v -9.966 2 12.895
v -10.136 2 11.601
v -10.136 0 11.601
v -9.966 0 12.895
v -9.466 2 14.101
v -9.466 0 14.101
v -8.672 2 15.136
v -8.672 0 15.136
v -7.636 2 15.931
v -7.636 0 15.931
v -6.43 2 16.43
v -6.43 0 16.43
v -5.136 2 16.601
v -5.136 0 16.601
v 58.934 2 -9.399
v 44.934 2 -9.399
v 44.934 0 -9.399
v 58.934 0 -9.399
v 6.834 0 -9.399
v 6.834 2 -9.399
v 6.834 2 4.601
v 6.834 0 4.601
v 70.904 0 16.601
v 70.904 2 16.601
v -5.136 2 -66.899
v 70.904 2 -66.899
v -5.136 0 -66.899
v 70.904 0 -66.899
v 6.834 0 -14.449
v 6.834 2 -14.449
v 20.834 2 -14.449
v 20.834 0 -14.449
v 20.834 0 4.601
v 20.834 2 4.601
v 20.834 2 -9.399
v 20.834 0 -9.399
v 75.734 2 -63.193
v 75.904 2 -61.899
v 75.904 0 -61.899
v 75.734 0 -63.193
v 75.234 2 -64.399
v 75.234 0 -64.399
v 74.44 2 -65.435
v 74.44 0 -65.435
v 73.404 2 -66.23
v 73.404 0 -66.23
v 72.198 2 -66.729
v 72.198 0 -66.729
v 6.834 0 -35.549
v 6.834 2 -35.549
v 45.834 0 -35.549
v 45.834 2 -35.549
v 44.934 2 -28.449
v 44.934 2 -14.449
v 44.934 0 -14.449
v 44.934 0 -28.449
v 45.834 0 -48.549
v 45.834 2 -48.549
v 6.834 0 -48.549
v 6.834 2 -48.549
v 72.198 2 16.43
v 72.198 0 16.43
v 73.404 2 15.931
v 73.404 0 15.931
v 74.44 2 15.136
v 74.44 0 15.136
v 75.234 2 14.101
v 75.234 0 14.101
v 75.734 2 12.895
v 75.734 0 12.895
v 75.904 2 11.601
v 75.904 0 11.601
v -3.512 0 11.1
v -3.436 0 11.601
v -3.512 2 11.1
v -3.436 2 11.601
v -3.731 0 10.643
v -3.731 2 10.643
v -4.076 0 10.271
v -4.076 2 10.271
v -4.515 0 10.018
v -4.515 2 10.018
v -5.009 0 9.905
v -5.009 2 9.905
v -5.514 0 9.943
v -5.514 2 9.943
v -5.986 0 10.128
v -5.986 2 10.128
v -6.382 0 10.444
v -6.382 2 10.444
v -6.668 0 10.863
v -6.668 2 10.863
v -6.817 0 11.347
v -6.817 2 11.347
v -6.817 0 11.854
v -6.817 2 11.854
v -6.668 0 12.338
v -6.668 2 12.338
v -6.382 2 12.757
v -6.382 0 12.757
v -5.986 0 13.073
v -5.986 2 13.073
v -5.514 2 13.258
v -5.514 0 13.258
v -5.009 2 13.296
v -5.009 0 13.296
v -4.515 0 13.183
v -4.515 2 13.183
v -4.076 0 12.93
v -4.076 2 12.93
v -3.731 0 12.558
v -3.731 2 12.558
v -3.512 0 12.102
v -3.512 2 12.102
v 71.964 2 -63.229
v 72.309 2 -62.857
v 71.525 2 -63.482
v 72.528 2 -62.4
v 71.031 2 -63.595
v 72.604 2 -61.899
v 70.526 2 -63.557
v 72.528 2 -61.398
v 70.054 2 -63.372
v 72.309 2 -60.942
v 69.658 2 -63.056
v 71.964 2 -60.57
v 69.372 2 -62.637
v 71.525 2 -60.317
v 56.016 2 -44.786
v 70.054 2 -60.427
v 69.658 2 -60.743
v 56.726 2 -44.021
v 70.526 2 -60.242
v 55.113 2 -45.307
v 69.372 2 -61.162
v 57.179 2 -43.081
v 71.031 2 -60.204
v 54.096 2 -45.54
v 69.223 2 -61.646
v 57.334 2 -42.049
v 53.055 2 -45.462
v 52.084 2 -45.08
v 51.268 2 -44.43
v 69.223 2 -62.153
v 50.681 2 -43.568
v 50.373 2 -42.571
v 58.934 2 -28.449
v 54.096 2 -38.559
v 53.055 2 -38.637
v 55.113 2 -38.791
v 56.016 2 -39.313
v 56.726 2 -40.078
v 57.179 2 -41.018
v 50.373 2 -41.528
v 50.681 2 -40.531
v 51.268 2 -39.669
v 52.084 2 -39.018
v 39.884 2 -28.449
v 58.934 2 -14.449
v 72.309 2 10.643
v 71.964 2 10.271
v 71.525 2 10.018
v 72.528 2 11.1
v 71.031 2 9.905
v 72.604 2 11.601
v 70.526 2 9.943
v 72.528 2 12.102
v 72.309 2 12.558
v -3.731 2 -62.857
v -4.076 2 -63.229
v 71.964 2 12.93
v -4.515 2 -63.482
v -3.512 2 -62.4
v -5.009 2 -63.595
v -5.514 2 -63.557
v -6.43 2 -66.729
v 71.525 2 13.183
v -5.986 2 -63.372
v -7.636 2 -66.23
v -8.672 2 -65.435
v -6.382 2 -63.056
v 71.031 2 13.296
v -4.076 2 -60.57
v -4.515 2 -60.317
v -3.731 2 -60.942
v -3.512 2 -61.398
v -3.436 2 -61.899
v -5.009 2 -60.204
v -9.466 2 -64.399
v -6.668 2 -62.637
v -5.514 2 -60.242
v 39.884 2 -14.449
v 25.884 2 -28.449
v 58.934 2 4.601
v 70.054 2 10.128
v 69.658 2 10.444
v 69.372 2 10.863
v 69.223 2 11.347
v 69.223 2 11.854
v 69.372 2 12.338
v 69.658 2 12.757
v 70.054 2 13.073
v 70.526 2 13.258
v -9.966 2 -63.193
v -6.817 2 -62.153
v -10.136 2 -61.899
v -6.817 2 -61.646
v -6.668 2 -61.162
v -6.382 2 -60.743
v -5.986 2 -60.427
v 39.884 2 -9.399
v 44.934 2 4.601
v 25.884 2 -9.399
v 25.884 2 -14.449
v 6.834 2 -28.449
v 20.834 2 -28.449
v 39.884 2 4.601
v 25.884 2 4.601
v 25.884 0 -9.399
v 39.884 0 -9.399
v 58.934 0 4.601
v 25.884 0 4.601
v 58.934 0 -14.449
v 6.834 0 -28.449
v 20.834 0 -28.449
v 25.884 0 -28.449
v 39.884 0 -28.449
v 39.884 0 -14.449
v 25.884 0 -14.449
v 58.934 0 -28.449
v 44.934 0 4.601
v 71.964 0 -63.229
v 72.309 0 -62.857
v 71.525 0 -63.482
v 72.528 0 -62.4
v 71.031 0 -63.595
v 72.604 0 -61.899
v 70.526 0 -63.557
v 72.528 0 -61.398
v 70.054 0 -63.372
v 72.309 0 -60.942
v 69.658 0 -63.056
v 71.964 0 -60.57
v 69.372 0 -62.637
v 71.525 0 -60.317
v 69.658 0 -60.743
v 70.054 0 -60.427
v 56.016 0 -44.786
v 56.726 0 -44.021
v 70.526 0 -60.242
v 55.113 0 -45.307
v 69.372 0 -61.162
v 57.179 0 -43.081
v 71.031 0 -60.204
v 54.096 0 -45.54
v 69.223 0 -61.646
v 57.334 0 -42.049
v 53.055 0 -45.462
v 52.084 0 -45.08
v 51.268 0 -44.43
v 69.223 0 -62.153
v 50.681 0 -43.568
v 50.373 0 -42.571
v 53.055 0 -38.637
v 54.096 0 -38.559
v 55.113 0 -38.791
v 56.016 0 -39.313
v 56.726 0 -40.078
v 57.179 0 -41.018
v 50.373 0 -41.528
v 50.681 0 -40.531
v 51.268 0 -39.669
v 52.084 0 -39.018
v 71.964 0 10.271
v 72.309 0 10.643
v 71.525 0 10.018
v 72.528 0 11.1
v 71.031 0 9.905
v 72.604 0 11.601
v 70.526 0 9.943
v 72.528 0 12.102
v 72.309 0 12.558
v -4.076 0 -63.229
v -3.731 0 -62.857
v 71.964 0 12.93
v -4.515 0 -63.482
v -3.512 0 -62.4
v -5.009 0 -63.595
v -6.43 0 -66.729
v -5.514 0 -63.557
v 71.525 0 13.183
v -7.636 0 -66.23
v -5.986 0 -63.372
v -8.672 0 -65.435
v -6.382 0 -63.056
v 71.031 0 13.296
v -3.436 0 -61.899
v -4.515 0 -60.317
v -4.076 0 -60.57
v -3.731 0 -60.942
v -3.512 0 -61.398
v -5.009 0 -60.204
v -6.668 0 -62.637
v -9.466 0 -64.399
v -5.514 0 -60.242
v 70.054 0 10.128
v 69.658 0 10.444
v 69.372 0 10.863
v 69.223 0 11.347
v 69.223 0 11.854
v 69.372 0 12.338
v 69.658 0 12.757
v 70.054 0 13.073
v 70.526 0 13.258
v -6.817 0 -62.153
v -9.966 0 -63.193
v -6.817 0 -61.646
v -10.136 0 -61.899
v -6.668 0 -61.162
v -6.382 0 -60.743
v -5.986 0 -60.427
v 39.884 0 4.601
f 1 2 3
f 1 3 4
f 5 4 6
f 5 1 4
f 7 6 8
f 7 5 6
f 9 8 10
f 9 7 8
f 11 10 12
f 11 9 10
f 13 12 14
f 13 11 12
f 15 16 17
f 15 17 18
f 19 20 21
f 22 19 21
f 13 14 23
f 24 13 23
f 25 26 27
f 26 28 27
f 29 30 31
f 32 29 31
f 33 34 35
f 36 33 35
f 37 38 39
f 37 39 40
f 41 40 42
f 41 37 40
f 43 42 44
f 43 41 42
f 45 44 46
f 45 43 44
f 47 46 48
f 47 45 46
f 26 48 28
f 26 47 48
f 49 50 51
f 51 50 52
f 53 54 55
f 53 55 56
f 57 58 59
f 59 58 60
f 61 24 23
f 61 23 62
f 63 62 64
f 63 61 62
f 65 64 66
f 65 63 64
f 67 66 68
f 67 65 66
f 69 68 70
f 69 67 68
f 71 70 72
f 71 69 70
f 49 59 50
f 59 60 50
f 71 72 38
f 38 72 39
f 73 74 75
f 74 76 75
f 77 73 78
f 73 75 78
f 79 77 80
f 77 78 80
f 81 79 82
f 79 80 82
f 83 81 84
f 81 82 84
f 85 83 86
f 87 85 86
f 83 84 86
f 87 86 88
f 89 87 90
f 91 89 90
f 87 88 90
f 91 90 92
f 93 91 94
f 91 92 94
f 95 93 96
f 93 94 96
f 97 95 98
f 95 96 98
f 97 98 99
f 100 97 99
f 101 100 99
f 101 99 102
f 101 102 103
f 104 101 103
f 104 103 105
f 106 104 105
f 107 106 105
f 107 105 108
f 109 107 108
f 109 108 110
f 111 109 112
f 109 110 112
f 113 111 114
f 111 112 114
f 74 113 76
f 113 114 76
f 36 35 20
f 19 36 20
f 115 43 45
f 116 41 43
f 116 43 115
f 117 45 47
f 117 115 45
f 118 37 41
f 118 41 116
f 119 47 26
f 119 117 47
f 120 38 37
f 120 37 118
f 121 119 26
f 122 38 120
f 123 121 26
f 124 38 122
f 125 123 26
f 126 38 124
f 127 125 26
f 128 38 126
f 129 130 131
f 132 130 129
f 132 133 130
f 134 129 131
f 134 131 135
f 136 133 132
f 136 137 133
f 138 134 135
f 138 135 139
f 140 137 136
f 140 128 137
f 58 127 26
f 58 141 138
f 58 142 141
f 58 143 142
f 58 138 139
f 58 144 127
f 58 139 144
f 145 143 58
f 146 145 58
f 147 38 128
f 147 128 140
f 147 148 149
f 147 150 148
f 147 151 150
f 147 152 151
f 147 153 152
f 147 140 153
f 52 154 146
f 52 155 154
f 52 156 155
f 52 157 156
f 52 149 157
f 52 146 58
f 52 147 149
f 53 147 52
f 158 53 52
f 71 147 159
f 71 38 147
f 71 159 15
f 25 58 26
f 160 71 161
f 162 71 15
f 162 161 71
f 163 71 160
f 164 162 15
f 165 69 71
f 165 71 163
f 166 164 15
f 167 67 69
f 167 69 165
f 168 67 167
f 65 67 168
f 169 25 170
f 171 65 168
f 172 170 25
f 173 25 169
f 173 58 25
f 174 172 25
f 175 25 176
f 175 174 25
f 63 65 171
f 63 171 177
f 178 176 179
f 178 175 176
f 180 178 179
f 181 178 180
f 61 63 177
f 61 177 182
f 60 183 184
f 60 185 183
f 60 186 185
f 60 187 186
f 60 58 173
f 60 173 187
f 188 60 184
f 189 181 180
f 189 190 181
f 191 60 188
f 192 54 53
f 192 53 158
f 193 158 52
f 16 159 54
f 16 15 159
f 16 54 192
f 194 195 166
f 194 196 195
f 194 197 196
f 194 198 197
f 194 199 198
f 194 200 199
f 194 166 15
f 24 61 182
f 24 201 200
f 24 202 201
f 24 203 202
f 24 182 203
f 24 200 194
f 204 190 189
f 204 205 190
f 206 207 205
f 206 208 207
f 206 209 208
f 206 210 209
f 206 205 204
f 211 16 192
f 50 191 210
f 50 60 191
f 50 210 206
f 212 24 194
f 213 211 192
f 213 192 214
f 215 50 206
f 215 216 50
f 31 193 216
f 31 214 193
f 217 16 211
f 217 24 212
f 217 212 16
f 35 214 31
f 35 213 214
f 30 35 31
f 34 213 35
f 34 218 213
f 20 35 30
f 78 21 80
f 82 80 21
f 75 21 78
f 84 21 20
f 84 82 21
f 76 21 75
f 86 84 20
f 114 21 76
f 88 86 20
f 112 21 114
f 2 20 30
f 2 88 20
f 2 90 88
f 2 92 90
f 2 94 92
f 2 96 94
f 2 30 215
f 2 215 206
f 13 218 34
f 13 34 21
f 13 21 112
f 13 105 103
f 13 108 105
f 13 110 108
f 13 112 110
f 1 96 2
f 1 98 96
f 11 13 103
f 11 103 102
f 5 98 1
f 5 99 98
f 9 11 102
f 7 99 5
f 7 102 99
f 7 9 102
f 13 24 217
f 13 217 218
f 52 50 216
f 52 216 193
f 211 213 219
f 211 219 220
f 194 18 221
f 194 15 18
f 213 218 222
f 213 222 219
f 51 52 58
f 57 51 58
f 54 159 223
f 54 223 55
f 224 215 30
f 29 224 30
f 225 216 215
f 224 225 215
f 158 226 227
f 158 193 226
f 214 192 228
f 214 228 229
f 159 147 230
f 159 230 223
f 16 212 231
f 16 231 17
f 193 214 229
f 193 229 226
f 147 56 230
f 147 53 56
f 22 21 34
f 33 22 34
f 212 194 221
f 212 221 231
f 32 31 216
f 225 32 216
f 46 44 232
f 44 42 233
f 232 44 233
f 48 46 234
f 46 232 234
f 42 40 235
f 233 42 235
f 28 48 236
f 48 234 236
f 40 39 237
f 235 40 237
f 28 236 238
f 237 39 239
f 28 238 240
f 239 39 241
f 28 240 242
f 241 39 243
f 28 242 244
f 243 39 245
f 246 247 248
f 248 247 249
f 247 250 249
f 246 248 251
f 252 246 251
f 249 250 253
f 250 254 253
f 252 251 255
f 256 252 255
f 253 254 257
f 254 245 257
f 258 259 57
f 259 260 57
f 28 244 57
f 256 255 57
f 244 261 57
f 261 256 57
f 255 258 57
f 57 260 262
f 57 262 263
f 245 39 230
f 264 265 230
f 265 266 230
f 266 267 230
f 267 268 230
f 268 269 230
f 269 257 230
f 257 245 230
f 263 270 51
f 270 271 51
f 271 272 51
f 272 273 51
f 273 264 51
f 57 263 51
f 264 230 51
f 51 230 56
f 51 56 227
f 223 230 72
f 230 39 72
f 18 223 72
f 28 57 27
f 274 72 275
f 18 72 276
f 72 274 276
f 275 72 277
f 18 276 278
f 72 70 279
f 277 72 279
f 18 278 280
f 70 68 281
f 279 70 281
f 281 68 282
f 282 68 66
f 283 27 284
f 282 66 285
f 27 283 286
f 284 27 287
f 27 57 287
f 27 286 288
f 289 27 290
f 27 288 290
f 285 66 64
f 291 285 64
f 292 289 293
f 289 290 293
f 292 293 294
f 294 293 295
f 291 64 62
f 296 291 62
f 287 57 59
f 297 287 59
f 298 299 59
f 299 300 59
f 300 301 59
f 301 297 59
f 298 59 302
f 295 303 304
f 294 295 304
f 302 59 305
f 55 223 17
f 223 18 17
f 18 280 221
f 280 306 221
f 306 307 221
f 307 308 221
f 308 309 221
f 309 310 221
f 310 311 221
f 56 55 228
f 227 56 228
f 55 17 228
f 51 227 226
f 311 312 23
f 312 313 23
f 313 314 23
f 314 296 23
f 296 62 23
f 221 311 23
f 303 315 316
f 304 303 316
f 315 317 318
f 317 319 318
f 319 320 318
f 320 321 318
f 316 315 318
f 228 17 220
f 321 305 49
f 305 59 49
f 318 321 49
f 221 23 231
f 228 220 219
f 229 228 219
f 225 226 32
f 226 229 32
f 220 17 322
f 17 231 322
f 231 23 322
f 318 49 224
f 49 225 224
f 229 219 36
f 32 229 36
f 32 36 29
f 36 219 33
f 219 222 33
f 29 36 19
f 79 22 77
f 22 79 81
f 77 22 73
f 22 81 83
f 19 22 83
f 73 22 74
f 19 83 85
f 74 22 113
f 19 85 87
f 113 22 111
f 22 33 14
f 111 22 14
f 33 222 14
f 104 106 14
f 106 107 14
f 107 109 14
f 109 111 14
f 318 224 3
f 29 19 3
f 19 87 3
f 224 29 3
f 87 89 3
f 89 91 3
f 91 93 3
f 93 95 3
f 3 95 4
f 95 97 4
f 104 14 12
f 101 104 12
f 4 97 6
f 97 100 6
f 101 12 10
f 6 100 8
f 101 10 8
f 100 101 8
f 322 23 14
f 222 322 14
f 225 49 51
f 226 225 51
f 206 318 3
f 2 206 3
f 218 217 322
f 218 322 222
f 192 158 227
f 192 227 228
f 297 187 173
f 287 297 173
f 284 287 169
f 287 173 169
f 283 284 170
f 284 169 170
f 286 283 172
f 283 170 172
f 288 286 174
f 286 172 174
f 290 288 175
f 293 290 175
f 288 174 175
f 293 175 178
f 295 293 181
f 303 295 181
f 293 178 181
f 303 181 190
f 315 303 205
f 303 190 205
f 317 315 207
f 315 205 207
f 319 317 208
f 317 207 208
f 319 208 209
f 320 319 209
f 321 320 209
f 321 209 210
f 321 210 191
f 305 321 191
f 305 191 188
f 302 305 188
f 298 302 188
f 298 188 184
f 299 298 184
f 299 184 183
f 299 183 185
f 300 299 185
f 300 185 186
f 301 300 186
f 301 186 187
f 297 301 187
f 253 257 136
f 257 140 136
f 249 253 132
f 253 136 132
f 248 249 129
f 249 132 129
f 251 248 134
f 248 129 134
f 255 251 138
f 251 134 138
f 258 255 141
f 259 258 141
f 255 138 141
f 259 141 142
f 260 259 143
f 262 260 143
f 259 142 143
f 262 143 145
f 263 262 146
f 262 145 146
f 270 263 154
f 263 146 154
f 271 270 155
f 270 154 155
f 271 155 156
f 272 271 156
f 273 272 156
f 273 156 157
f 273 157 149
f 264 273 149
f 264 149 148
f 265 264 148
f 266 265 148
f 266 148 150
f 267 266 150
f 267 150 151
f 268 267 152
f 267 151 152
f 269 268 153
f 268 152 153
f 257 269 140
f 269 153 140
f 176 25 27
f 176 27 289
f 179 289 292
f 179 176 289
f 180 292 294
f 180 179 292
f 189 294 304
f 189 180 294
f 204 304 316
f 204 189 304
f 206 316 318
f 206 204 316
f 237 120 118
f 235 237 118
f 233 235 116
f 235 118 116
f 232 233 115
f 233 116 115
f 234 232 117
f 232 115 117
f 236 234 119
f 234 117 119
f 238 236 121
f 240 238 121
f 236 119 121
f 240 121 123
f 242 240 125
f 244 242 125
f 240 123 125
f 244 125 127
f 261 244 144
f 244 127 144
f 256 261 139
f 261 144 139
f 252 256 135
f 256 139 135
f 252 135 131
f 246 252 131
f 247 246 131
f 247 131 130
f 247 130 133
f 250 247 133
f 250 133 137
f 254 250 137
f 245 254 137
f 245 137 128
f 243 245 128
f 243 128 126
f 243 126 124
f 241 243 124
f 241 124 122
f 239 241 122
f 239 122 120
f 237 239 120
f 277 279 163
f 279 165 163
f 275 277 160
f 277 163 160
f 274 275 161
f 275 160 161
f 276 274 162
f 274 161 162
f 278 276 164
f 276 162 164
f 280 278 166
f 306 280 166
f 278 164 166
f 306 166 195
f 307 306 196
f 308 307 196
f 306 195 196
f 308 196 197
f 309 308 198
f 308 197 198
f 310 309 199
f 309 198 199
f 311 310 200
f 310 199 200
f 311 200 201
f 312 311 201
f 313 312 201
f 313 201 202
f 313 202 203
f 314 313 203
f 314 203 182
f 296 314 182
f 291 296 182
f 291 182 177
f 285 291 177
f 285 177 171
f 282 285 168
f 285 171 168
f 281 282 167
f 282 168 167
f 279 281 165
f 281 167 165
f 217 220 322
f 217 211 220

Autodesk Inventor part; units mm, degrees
ref_plane "YZ Plane" through (0, 0, 0) normal (1, 0, 0) x (0, 1, 0)
ref_plane "XZ Plane" through (0, 0, 0) normal (0, 1, 0) x (-1, 0, 0)
ref_plane "XY Plane" through (0, 0, 0) normal (0, 0, 1) x (1, 0, 0)
sketch "Sketch1" plane through (0, 0, 0) normal (0, 1, 0) x (-1, 0, 0)
  line L0 (10.136, 16.6006) -> (-75.904, 16.6006)
  line L1 (-75.904, 16.6006) -> (-75.904, -66.8994)
  line L2 (-75.904, -66.8994) -> (10.136, -66.8994)
  line L3 (10.136, -66.8994) -> (10.136, 16.6006)
  point P0 (0, 0)
  dimension "d0" = 86.04
  dimension "d1" = 83.5
extrude "Extrusion1" add sketch "Sketch1" along normal blind 2
sketch "Sketch2" plane through (0, 2, 0) normal (0, 1, 0) x (1, 0, 0)
  circle A0 centre (-5.136, -11.6006) radius 1.7
  line L0 (-10.136, 66.8994) -> (-10.136, -16.6006) projected
  line L1 (-10.136, -16.6006) -> (75.904, -16.6006) projected
  circle A1 centre (70.904, -11.6006) radius 1.7
  line L2 (75.904, -16.6006) -> (75.904, 66.8994) projected
  circle A2 centre (70.904, 61.8994) radius 1.7
  line L3 (75.904, 66.8994) -> (-10.136, 66.8994) projected
  circle A3 centre (-5.136, 61.8994) radius 1.7
  point P0 (0, 0)
  dimension "d4" = 3.4
  dimension "d5" = 5
  dimension "d6" = 5
  dimension "d7" = 3.4
  dimension "d8" = 5
  dimension "d9" = 5
  dimension "d10" = 3.4
  dimension "d11" = 5
  dimension "d12" = 5
  dimension "d13" = 3.4
  dimension "d14" = 5
  dimension "d15" = 5
extrude "Extrusion2" cut sketch "Sketch2" against normal blind 2 contours A0 | A1 | A2 | A3
sketch "Sketch3" plane through (0, 2, 0) normal (0, 1, 0) x (1, 0, 0)
  line L0 (6.834, -4.6006) -> (20.834, -4.6006)
  line L1 (20.834, -4.6006) -> (20.834, 9.3994)
  line L2 (20.834, 9.3994) -> (6.834, 9.3994)
  line L3 (6.834, 9.3994) -> (6.834, -4.6006)
  line L4 (25.884, 9.3994) -> (39.884, 9.3994)
  line L5 (39.884, 9.3994) -> (39.884, -4.6006)
  line L6 (39.884, -4.6006) -> (25.884, -4.6006)
  line L7 (25.884, -4.6006) -> (25.884, 9.3994)
  line L8 (44.934, 9.3994) -> (58.934, 9.3994)
  line L9 (58.934, 9.3994) -> (58.934, -4.6006)
  line L10 (58.934, -4.6006) -> (44.934, -4.6006)
  line L11 (44.934, -4.6006) -> (44.934, 9.3994)
  line L12 (6.834, 14.4494) -> (20.834, 14.4494)
  line L13 (20.834, 14.4494) -> (20.834, 28.4494)
  line L14 (20.834, 28.4494) -> (6.834, 28.4494)
  line L15 (6.834, 28.4494) -> (6.834, 14.4494)
  line L16 (25.884, 28.4494) -> (39.884, 28.4494)
  line L17 (39.884, 28.4494) -> (39.884, 14.4494)
  line L18 (39.884, 14.4494) -> (25.884, 14.4494)
  line L19 (25.884, 14.4494) -> (25.884, 28.4494)
  line L20 (44.934, 28.4494) -> (58.934, 28.4494)
  line L21 (58.934, 28.4494) -> (58.934, 14.4494)
  line L22 (58.934, 14.4494) -> (44.934, 14.4494)
  line L23 (44.934, 14.4494) -> (44.934, 28.4494)
  line L24 (-10.136, 66.8994) -> (-10.136, -16.6006) projected
  line L25 (-10.136, -16.6006) -> (75.904, -16.6006) projected
  line L26 (6.834, 35.5494) -> (45.834, 35.5494)
  line L27 (45.834, 35.5494) -> (45.834, 48.5494)
  line L28 (45.834, 48.5494) -> (6.834, 48.5494)
  line L29 (6.834, 48.5494) -> (6.834, 35.5494)
  circle A0 centre (53.834, 42.0494) radius 3.5
  point P0 (0, 0)
  point P1 (25.884, 21.4494)
  point P2 (20.834, 21.4494)
  point P3 (6.834, 21.4494)
  point P4 (32.884, 9.3994)
  point P5 (32.884, 14.4494)
  point P6 (32.884, -16.6006)
  point P7 (51.934, -4.6006)
  point P8 (13.834, 28.4494)
  point P9 (45.834, 42.0494)
  dimension "d18" = 14
  dimension "d19" = 14
  dimension "d20" = 14
  dimension "d21" = 5.05
  dimension "d22" = 14
  dimension "d23" = 5.05
  dimension "d24" = 14
  dimension "d25" = 14
  dimension "d26" = 5.05
  dimension "d27" = 14
  dimension "d28" = 14
  dimension "d29" = 14
  dimension "d30" = 14
  dimension "d31" = 5.05
  dimension "d32" = 5.05
  dimension "d33" = 5.05
  dimension "d34" = 16.97
  dimension "d35" = 5.05
  dimension "d39" = 12
  dimension "d40" = 12
  dimension "d41" = 12
  dimension "d42" = 39
  dimension "d43" = 13
  dimension "d44" = 7.1
  dimension "d45" = 7
  dimension "d46" = 8
extrude "Extrusion3" cut sketch "Sketch3" against normal blind 2
fillet "Fillet1" radius 5 4 edges at (-10.136, 1, 16.6006) (75.904, 1, 16.6006) (75.904, 1, -66.8994) (-10.136, 1, -66.8994)
properties part number "Case_Top"
